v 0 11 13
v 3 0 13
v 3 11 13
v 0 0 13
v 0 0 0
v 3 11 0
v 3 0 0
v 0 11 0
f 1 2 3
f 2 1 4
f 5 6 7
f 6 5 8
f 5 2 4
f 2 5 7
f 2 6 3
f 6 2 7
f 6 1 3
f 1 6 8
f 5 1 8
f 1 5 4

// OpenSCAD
// Generated by SolidPython 1.0.1 on 2020-07-29 00:46:54


cube(size = [3, 11, 13]);
/***********************************************
*********      SolidPython code:      **********
************************************************
 
# import packages: SolidPython
from solid import *
from solid.utils import *
from itertools import chain, combinations, permutations


class Resize:

    def __init__(self, scad_file):
        self.scad_file = scad_file
        #self.scad_file = import_scad(scad_file)
        # cone/cylinder param:
        self.r1 = 0
        self.r2 = 0
        self.h = 0
        # rectangular prism param:
        self.w = 0
        self.l = 0
        # ellipse param:
        self.r = 0

    # import OpenScad code (file name corresponds to shape)


    # classify shape + parameters
    def assign(self, param1, param2, param3):
        if self.scad_file == 'cone.scad':
            self.r1 = param1
            self.r2 = param2
            self.h = param3
        elif self.scad_file == 'cylinder.scad':
            self.r1 = param1
            self.r2 = param2
            self.h = param3
        elif self.scad_file == 'rectangularPrism.scad':
            self.h = param1
            self.l = param2
            self.w = param3
        else:
            self.r = param1
            self.h = param2

    # resize parameters
    def iterate(self):
        x = range(3, 20, 2)
        i = 1
        if self.scad_file == 'cone.scad':
            tempList = list(permutations(x, 2))
            for temp in tempList:
                param1 = temp[0]
                param2 = temp[1]
                filepath = 'produced_scad_files/' + 'cone' + str(param1) + '_' + str(param2) + '_' + '.scad'
                scad_render_to_file(cylinder(h=param1, r1=param2, r2=0), filepath)

        elif self.scad_file == 'cylinder.scad':
            tempList = list(permutations(x, 3))
            for temp in tempList:
                param1 = temp[0]
                param2 = temp[1]
                filepath = 'produced_scad_files/' + 'cylinder' + str(param1) + '_' + str(param2) + '_' + '.scad'
                scad_render_to_file(cylinder(h=param1, r1=param2, r2=param2), filepath)

        elif self.scad_file == 'rectangularPrism.scad':
            tempList = list(permutations(x, 3))
            for temp in tempList:
                param1 = temp[0]
                param2 = temp[1]
                param3 = temp[2]
                filepath = 'produced_scad_files/' + 'rectangularPrism' + str(param1) + '_' + str(param2) + '_' + str(
                    param3) + '.scad'
                scad_render_to_file(cube(size=(param1, param2, param3)), filepath)

        elif self.scad_file == 'ellipse.scad':
            tempList = list(permutations(x, 4))
            for temp in tempList:
                param1 = temp[0]
                param2 = temp[1]
                param3 = temp[2]
                param4 = temp[3]
                filepath = 'produced_scad_files/' + 'ellipse' + str(param1) + '_' + str(param2) + '_' + str(param3) + '_' + str(param4) + '.scad'
                scad_render_to_file(scale([param1, param2, param3])(sphere(r=param4)), filepath)

    def render_to_scadfile(self):
        scad_render_to_file(scad, 'example.scad') 
 
************************************************/
